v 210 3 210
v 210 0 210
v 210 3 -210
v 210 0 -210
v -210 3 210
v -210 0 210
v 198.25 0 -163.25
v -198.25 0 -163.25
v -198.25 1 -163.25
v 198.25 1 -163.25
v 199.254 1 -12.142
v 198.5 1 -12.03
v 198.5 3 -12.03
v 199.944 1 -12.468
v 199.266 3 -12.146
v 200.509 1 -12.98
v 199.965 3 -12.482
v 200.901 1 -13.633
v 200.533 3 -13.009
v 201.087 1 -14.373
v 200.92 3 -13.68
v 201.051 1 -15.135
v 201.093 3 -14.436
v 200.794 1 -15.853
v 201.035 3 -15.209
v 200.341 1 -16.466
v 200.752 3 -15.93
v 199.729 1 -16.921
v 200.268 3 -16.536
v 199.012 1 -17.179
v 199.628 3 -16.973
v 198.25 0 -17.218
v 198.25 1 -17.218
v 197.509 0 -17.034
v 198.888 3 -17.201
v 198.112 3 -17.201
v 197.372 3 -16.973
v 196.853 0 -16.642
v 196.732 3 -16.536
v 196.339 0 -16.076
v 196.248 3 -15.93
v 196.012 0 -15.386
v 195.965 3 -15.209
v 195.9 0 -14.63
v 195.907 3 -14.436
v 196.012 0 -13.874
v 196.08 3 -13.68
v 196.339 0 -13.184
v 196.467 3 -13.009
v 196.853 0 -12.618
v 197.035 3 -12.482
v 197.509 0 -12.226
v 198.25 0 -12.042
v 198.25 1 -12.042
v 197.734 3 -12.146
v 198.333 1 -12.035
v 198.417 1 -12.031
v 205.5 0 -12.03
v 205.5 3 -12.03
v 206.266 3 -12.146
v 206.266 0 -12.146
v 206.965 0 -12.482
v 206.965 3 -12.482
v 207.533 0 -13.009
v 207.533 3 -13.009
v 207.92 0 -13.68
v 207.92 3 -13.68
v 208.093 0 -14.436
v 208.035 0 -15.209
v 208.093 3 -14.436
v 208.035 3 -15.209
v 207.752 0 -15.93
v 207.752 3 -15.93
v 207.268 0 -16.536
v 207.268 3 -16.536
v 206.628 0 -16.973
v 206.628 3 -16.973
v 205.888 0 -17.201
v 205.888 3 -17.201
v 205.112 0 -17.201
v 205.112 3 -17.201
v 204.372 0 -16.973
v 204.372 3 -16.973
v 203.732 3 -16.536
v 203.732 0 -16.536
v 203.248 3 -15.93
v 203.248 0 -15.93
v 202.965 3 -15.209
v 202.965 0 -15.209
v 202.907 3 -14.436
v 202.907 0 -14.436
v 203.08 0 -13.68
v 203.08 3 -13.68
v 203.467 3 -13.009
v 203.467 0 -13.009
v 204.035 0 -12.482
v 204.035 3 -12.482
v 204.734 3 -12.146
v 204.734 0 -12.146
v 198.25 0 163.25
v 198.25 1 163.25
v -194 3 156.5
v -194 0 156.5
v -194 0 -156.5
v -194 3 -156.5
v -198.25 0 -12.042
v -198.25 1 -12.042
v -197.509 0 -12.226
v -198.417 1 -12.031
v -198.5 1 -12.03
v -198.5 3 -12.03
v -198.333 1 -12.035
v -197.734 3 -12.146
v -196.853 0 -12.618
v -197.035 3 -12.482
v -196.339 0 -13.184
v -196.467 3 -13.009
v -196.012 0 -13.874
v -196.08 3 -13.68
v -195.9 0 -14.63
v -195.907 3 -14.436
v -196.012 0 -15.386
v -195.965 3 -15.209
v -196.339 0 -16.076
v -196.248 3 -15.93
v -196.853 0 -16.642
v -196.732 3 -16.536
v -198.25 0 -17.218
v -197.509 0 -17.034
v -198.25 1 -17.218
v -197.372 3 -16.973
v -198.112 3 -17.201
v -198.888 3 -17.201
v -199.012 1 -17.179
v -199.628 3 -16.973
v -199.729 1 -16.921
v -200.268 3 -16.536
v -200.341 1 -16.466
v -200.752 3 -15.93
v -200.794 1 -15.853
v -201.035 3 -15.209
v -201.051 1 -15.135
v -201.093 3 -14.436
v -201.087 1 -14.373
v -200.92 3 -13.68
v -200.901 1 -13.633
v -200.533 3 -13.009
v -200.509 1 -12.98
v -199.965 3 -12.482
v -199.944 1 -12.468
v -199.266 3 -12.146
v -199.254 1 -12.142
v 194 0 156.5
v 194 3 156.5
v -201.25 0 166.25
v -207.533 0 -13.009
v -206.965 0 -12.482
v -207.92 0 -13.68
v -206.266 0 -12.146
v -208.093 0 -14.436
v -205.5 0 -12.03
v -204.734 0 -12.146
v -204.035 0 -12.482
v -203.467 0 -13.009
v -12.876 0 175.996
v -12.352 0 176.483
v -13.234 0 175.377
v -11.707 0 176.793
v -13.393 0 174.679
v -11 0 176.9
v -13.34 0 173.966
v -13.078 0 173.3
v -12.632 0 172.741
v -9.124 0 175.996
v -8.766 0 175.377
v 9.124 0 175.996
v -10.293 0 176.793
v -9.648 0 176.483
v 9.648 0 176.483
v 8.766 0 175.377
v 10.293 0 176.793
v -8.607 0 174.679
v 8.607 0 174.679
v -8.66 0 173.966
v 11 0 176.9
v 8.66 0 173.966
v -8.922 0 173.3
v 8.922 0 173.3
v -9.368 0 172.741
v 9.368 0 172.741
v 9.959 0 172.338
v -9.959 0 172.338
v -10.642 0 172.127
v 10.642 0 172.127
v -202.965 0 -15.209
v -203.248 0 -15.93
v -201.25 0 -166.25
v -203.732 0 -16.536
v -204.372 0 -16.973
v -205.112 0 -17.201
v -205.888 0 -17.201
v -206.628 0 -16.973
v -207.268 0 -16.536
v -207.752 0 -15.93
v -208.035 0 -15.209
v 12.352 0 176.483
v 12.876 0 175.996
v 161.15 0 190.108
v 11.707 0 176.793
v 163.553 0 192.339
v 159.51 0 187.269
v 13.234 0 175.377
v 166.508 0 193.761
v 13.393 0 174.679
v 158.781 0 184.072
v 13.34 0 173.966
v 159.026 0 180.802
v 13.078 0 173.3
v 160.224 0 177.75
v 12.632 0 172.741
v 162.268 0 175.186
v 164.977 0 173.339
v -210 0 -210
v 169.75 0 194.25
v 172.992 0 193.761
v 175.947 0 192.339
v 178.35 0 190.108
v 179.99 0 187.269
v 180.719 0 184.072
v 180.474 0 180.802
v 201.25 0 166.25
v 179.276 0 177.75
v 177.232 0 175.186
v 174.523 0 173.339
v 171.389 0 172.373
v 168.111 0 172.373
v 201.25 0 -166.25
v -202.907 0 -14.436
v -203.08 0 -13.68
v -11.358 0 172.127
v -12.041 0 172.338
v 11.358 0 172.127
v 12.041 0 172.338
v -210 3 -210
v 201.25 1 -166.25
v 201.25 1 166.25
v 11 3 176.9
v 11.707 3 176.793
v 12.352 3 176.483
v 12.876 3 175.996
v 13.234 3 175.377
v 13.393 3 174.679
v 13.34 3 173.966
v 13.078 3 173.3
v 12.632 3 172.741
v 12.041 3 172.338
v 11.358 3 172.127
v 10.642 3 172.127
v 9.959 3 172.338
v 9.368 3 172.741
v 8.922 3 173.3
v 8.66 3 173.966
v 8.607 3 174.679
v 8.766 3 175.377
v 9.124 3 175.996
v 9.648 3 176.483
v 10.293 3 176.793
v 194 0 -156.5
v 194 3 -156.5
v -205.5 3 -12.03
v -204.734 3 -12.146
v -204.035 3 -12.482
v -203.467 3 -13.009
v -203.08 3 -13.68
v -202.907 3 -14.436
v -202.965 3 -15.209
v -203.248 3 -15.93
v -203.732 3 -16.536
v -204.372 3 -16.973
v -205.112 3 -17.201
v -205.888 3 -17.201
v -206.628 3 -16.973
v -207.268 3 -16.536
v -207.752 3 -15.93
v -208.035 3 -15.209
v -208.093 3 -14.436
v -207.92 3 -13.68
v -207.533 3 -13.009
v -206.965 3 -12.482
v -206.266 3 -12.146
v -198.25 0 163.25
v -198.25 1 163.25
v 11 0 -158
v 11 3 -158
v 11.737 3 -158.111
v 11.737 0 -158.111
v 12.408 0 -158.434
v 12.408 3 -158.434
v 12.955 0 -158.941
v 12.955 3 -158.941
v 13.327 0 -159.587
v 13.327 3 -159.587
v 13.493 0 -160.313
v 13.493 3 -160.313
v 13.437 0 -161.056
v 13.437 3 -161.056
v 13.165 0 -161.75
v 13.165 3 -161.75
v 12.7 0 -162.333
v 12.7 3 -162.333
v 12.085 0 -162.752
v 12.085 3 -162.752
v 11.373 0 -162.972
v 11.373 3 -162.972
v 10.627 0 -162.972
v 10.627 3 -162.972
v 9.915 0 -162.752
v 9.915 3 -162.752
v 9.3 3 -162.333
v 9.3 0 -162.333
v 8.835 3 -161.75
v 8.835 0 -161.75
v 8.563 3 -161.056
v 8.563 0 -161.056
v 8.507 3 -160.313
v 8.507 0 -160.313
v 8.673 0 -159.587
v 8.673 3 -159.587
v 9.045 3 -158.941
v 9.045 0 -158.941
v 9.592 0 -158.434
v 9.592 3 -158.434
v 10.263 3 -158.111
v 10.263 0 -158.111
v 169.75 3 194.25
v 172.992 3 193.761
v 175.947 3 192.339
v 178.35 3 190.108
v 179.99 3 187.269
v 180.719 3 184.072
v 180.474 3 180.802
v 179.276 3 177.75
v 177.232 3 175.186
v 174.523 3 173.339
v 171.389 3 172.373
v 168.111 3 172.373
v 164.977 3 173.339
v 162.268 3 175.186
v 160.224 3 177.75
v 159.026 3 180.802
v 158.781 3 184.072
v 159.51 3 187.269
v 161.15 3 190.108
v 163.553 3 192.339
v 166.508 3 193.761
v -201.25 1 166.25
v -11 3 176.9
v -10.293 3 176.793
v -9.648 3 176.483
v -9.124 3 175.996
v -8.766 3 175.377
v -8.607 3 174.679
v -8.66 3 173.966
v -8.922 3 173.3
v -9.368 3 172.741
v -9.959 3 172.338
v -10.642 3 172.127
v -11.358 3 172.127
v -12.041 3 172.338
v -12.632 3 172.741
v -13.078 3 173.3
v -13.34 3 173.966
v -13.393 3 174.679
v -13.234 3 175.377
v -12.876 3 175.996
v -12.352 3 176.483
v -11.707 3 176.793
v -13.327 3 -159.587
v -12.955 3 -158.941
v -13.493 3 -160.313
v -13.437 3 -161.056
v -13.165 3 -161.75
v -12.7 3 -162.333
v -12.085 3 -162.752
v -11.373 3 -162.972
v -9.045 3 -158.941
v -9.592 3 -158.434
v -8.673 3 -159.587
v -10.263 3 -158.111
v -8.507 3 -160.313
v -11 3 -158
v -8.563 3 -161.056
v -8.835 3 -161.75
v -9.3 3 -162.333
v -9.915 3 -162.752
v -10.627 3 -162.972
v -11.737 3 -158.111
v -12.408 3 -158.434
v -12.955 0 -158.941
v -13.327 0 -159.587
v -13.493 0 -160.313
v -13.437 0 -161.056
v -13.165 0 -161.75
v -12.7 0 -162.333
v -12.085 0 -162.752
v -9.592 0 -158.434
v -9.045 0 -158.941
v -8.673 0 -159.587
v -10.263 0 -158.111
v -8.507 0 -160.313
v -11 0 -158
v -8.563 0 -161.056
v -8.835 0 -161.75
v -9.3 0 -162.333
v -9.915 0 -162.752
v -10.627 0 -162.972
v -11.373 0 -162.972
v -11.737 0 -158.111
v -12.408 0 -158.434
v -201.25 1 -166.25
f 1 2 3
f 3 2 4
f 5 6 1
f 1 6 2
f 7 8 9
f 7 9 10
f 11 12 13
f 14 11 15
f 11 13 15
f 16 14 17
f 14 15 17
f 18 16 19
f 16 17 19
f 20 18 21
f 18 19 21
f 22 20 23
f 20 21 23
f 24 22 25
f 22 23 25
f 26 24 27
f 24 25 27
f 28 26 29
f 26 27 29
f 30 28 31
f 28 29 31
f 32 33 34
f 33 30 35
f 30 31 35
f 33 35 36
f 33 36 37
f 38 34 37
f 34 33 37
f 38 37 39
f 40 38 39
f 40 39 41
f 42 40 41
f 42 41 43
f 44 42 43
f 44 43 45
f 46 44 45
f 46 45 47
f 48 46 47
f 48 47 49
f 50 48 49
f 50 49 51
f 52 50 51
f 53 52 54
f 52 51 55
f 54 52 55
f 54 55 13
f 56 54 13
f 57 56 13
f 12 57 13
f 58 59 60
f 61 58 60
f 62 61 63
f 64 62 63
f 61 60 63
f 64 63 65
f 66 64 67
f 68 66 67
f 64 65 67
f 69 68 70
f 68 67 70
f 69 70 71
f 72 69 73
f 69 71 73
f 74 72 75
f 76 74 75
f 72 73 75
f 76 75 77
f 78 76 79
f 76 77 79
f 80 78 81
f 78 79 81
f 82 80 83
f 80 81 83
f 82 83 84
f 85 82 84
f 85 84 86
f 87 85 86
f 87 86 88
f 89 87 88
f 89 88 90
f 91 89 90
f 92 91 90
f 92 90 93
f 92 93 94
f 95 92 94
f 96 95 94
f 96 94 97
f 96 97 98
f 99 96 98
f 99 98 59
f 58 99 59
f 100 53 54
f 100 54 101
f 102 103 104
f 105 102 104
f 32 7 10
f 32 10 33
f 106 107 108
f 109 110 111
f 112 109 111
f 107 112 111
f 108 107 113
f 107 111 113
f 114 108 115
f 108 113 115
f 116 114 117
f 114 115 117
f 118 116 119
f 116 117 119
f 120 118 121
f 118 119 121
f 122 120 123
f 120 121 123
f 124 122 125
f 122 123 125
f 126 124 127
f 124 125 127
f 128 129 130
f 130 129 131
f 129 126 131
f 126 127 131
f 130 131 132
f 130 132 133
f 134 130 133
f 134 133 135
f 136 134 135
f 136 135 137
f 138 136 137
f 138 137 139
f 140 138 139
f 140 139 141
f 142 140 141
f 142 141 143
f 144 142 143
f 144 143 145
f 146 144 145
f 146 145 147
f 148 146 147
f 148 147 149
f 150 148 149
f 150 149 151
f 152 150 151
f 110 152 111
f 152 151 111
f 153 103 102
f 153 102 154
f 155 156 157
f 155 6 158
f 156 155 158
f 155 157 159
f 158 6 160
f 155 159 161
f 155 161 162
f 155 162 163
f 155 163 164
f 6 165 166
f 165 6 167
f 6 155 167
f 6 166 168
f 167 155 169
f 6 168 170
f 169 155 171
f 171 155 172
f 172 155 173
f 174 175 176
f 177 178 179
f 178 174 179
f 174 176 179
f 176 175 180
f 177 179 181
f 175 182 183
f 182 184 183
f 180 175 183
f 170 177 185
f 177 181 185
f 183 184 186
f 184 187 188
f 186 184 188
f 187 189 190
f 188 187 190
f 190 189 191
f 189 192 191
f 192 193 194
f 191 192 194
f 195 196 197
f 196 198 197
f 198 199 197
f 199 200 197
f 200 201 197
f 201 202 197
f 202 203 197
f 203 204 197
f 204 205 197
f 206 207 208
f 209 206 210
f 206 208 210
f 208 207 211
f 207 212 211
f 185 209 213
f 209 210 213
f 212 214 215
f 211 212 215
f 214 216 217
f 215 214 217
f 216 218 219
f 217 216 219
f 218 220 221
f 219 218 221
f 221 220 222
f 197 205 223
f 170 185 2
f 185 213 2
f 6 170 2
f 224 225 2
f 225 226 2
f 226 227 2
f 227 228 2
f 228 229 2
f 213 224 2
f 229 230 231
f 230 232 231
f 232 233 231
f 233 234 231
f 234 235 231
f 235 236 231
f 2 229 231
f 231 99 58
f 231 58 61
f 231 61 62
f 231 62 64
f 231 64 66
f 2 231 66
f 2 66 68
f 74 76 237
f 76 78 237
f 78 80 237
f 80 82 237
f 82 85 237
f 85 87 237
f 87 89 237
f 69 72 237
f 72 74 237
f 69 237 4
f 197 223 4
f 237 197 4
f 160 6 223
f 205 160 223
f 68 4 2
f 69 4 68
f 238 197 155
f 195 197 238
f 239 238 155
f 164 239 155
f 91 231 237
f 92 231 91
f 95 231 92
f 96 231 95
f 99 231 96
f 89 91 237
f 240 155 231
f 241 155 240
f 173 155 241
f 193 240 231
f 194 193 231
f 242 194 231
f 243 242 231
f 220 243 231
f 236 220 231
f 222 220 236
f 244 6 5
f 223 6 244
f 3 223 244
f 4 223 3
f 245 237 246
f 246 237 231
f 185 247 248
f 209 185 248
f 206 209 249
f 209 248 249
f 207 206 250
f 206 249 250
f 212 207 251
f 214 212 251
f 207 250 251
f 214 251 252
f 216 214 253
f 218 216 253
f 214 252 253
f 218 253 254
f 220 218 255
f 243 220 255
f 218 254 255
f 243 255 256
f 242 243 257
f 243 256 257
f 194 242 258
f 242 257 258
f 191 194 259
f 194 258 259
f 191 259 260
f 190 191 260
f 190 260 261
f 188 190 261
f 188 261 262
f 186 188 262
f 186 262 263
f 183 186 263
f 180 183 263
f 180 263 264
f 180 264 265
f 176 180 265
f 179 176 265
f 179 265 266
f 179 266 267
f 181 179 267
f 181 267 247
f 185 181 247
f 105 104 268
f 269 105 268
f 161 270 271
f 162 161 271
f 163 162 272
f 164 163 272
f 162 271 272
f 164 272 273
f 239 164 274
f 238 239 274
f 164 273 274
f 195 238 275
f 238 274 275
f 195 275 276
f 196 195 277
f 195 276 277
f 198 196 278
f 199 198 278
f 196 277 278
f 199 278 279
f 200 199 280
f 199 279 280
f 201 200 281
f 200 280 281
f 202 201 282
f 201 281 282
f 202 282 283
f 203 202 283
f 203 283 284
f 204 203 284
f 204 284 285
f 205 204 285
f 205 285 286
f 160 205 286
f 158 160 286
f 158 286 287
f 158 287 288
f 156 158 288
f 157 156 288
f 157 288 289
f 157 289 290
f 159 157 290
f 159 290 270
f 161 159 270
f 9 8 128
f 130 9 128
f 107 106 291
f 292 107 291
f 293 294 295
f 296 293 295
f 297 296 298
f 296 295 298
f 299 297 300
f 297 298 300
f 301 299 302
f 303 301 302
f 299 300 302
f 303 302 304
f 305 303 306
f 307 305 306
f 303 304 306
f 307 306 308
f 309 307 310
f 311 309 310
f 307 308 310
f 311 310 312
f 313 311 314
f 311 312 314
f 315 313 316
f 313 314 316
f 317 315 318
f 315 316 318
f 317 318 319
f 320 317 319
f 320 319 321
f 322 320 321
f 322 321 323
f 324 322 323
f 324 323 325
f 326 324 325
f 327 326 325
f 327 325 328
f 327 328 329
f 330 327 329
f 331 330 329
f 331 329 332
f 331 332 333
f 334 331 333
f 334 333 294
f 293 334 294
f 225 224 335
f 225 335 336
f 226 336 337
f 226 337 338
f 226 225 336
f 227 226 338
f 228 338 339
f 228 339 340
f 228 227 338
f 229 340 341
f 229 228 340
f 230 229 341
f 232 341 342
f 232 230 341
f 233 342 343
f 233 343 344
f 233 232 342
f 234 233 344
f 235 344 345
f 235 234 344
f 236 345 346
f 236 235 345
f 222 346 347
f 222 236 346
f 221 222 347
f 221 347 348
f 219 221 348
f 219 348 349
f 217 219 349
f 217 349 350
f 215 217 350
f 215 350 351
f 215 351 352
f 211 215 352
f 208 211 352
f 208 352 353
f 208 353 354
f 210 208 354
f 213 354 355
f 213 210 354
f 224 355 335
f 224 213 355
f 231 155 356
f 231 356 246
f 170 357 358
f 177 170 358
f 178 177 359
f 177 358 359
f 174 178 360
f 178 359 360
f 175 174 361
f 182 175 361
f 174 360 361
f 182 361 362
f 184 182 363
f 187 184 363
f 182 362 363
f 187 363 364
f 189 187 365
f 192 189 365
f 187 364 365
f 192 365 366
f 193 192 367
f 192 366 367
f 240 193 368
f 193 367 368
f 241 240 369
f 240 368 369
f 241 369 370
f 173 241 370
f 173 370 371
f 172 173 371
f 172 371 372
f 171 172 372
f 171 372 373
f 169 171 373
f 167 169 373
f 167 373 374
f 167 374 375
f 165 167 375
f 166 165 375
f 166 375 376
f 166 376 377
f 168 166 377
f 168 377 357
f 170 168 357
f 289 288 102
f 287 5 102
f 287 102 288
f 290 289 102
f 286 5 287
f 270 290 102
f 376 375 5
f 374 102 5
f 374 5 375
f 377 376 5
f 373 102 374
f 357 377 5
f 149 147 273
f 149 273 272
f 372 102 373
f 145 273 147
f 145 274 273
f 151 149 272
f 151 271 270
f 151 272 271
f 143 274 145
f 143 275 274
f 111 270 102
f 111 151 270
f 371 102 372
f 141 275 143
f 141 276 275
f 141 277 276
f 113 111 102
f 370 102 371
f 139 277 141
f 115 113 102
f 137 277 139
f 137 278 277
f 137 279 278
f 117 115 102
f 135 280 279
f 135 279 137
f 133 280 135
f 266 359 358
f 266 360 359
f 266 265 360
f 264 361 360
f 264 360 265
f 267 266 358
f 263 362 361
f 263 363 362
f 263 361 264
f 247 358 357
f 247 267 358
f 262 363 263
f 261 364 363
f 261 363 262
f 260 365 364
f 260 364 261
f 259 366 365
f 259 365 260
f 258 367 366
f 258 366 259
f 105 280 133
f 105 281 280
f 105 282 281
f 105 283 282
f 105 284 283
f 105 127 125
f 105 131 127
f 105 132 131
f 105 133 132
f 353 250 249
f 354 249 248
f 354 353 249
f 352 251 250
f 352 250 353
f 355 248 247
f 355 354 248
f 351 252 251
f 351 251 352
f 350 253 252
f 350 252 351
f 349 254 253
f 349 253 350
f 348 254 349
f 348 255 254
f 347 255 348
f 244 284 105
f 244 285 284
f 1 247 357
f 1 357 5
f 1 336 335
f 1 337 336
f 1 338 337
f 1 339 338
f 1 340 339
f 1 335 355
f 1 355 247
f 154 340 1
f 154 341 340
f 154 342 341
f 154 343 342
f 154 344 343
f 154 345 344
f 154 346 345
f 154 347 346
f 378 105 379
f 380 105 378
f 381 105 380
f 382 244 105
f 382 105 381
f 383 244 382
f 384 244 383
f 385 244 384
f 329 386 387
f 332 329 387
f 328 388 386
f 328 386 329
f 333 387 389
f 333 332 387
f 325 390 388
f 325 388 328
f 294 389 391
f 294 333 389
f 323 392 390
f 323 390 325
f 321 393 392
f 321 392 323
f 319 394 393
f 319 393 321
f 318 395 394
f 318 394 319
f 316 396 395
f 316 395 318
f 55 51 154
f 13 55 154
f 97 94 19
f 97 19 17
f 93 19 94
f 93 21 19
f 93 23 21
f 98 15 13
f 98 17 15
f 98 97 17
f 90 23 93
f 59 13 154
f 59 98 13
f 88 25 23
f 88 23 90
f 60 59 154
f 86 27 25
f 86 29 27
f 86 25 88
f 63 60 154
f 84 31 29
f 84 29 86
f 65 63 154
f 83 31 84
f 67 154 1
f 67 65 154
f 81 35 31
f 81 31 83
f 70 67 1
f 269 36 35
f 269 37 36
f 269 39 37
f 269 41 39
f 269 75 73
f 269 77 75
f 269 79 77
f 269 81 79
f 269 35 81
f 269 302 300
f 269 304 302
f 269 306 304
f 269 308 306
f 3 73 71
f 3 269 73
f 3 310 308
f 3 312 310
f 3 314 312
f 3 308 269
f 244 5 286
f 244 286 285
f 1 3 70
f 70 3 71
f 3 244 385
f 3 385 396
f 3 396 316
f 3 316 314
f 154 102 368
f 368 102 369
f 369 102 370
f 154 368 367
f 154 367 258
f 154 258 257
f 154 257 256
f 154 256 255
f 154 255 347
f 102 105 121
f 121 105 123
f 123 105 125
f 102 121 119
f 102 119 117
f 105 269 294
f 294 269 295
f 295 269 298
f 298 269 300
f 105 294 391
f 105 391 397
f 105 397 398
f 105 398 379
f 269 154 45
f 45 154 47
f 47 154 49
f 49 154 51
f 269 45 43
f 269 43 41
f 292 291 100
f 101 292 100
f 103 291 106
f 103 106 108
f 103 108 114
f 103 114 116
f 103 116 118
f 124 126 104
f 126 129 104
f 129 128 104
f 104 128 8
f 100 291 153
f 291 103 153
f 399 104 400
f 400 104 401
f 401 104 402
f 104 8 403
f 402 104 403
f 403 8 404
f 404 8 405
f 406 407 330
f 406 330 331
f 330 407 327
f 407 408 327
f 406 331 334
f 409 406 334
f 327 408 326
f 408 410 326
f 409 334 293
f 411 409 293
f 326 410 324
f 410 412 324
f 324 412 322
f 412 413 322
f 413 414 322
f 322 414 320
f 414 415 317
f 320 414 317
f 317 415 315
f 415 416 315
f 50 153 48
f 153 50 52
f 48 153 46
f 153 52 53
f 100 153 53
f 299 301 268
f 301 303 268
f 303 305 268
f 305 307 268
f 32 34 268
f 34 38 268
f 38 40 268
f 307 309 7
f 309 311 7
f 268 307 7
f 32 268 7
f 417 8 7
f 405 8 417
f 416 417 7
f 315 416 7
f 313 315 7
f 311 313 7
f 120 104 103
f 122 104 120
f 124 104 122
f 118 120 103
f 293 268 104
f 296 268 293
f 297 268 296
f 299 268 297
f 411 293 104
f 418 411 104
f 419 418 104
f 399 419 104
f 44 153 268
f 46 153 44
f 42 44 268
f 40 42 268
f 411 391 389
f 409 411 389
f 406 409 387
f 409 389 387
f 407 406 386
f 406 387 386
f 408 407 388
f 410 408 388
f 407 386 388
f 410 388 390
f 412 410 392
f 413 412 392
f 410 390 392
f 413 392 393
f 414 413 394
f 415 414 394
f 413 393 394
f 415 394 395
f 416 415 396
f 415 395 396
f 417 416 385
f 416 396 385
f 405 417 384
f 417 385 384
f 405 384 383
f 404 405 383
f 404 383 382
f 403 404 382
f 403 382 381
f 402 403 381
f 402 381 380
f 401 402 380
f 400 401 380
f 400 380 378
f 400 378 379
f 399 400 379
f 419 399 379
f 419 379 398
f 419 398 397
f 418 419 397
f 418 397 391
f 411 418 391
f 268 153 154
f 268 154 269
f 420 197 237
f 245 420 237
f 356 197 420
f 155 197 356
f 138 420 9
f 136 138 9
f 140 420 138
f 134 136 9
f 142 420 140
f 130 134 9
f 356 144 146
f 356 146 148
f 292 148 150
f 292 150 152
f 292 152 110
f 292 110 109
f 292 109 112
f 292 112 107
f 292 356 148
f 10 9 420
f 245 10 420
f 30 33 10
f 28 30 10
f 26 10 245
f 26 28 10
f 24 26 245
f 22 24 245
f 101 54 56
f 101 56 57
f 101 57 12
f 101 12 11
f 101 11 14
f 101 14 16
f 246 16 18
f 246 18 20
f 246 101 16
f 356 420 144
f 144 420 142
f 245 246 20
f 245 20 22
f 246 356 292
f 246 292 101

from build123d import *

# Parameters (mm, degrees)
SKETCH1_W           = 420
SKETCH1_H           = 420
SKETCH1_R           = 11
SKETCH1_W_2         = 388
SKETCH1_H_2         = 313
BOSS_EXTRUDE1_DEPTH = 3
SKETCH2_W           = 402.5
SKETCH2_H           = 332.5
SKETCH2_W_2         = 396.5
SKETCH2_H_2         = 326.5
CUT_EXTRUDE1_DEPTH  = 1
SKETCH5_R           = 2.6
SKETCH5_R_2         = 2.5
SKETCH5_R_3         = 2.4
CUT_EXTRUDE8_DEPTH  = 298


with BuildPart() as part:
    # Sketch1 → Boss-Extrude1 (new body)
    with BuildSketch(Plane(origin=(0, 0, 0), x_dir=(1, 0, 0), z_dir=(0, 1, 0))):
        Rectangle(SKETCH1_W, SKETCH1_H)
        with Locations((169.75, -183.25)):
            Circle(SKETCH1_R, mode=Mode.SUBTRACT)
        Rectangle(SKETCH1_W_2, SKETCH1_H_2, mode=Mode.SUBTRACT)
    extrude(amount=BOSS_EXTRUDE1_DEPTH)

    # Sketch2 → Cut-Extrude1 (cut)
    with BuildSketch(Plane.XZ):
        Rectangle(SKETCH2_W, SKETCH2_H)
        Rectangle(SKETCH2_W_2, SKETCH2_H_2, mode=Mode.SUBTRACT)
    extrude(amount=-CUT_EXTRUDE1_DEPTH, mode=Mode.SUBTRACT)

    # Sketch5 → Cut-Extrude8 (cut, through all)
    with BuildSketch(Plane(origin=(0, 3, 0), x_dir=(1, 0, 0), z_dir=(0, 1, 0))):
        with Locations((-205.5, 14.63)):
            Circle(SKETCH5_R)
        with Locations((-198.5, 14.63)):
            Circle(SKETCH5_R)
        with Locations((198.5, 14.63)):
            Circle(SKETCH5_R)
        with Locations((205.5, 14.63)):
            Circle(SKETCH5_R)
        with Locations((-11, 160.5)):
            Circle(SKETCH5_R_2)
        with Locations((11, 160.5)):
            Circle(SKETCH5_R_2)
        with Locations((-11, -174.5)):
            Circle(SKETCH5_R_3)
        with Locations((11, -174.5)):
            Circle(SKETCH5_R_3)
    extrude(amount=-CUT_EXTRUDE8_DEPTH, mode=Mode.SUBTRACT)


solid = part.part
